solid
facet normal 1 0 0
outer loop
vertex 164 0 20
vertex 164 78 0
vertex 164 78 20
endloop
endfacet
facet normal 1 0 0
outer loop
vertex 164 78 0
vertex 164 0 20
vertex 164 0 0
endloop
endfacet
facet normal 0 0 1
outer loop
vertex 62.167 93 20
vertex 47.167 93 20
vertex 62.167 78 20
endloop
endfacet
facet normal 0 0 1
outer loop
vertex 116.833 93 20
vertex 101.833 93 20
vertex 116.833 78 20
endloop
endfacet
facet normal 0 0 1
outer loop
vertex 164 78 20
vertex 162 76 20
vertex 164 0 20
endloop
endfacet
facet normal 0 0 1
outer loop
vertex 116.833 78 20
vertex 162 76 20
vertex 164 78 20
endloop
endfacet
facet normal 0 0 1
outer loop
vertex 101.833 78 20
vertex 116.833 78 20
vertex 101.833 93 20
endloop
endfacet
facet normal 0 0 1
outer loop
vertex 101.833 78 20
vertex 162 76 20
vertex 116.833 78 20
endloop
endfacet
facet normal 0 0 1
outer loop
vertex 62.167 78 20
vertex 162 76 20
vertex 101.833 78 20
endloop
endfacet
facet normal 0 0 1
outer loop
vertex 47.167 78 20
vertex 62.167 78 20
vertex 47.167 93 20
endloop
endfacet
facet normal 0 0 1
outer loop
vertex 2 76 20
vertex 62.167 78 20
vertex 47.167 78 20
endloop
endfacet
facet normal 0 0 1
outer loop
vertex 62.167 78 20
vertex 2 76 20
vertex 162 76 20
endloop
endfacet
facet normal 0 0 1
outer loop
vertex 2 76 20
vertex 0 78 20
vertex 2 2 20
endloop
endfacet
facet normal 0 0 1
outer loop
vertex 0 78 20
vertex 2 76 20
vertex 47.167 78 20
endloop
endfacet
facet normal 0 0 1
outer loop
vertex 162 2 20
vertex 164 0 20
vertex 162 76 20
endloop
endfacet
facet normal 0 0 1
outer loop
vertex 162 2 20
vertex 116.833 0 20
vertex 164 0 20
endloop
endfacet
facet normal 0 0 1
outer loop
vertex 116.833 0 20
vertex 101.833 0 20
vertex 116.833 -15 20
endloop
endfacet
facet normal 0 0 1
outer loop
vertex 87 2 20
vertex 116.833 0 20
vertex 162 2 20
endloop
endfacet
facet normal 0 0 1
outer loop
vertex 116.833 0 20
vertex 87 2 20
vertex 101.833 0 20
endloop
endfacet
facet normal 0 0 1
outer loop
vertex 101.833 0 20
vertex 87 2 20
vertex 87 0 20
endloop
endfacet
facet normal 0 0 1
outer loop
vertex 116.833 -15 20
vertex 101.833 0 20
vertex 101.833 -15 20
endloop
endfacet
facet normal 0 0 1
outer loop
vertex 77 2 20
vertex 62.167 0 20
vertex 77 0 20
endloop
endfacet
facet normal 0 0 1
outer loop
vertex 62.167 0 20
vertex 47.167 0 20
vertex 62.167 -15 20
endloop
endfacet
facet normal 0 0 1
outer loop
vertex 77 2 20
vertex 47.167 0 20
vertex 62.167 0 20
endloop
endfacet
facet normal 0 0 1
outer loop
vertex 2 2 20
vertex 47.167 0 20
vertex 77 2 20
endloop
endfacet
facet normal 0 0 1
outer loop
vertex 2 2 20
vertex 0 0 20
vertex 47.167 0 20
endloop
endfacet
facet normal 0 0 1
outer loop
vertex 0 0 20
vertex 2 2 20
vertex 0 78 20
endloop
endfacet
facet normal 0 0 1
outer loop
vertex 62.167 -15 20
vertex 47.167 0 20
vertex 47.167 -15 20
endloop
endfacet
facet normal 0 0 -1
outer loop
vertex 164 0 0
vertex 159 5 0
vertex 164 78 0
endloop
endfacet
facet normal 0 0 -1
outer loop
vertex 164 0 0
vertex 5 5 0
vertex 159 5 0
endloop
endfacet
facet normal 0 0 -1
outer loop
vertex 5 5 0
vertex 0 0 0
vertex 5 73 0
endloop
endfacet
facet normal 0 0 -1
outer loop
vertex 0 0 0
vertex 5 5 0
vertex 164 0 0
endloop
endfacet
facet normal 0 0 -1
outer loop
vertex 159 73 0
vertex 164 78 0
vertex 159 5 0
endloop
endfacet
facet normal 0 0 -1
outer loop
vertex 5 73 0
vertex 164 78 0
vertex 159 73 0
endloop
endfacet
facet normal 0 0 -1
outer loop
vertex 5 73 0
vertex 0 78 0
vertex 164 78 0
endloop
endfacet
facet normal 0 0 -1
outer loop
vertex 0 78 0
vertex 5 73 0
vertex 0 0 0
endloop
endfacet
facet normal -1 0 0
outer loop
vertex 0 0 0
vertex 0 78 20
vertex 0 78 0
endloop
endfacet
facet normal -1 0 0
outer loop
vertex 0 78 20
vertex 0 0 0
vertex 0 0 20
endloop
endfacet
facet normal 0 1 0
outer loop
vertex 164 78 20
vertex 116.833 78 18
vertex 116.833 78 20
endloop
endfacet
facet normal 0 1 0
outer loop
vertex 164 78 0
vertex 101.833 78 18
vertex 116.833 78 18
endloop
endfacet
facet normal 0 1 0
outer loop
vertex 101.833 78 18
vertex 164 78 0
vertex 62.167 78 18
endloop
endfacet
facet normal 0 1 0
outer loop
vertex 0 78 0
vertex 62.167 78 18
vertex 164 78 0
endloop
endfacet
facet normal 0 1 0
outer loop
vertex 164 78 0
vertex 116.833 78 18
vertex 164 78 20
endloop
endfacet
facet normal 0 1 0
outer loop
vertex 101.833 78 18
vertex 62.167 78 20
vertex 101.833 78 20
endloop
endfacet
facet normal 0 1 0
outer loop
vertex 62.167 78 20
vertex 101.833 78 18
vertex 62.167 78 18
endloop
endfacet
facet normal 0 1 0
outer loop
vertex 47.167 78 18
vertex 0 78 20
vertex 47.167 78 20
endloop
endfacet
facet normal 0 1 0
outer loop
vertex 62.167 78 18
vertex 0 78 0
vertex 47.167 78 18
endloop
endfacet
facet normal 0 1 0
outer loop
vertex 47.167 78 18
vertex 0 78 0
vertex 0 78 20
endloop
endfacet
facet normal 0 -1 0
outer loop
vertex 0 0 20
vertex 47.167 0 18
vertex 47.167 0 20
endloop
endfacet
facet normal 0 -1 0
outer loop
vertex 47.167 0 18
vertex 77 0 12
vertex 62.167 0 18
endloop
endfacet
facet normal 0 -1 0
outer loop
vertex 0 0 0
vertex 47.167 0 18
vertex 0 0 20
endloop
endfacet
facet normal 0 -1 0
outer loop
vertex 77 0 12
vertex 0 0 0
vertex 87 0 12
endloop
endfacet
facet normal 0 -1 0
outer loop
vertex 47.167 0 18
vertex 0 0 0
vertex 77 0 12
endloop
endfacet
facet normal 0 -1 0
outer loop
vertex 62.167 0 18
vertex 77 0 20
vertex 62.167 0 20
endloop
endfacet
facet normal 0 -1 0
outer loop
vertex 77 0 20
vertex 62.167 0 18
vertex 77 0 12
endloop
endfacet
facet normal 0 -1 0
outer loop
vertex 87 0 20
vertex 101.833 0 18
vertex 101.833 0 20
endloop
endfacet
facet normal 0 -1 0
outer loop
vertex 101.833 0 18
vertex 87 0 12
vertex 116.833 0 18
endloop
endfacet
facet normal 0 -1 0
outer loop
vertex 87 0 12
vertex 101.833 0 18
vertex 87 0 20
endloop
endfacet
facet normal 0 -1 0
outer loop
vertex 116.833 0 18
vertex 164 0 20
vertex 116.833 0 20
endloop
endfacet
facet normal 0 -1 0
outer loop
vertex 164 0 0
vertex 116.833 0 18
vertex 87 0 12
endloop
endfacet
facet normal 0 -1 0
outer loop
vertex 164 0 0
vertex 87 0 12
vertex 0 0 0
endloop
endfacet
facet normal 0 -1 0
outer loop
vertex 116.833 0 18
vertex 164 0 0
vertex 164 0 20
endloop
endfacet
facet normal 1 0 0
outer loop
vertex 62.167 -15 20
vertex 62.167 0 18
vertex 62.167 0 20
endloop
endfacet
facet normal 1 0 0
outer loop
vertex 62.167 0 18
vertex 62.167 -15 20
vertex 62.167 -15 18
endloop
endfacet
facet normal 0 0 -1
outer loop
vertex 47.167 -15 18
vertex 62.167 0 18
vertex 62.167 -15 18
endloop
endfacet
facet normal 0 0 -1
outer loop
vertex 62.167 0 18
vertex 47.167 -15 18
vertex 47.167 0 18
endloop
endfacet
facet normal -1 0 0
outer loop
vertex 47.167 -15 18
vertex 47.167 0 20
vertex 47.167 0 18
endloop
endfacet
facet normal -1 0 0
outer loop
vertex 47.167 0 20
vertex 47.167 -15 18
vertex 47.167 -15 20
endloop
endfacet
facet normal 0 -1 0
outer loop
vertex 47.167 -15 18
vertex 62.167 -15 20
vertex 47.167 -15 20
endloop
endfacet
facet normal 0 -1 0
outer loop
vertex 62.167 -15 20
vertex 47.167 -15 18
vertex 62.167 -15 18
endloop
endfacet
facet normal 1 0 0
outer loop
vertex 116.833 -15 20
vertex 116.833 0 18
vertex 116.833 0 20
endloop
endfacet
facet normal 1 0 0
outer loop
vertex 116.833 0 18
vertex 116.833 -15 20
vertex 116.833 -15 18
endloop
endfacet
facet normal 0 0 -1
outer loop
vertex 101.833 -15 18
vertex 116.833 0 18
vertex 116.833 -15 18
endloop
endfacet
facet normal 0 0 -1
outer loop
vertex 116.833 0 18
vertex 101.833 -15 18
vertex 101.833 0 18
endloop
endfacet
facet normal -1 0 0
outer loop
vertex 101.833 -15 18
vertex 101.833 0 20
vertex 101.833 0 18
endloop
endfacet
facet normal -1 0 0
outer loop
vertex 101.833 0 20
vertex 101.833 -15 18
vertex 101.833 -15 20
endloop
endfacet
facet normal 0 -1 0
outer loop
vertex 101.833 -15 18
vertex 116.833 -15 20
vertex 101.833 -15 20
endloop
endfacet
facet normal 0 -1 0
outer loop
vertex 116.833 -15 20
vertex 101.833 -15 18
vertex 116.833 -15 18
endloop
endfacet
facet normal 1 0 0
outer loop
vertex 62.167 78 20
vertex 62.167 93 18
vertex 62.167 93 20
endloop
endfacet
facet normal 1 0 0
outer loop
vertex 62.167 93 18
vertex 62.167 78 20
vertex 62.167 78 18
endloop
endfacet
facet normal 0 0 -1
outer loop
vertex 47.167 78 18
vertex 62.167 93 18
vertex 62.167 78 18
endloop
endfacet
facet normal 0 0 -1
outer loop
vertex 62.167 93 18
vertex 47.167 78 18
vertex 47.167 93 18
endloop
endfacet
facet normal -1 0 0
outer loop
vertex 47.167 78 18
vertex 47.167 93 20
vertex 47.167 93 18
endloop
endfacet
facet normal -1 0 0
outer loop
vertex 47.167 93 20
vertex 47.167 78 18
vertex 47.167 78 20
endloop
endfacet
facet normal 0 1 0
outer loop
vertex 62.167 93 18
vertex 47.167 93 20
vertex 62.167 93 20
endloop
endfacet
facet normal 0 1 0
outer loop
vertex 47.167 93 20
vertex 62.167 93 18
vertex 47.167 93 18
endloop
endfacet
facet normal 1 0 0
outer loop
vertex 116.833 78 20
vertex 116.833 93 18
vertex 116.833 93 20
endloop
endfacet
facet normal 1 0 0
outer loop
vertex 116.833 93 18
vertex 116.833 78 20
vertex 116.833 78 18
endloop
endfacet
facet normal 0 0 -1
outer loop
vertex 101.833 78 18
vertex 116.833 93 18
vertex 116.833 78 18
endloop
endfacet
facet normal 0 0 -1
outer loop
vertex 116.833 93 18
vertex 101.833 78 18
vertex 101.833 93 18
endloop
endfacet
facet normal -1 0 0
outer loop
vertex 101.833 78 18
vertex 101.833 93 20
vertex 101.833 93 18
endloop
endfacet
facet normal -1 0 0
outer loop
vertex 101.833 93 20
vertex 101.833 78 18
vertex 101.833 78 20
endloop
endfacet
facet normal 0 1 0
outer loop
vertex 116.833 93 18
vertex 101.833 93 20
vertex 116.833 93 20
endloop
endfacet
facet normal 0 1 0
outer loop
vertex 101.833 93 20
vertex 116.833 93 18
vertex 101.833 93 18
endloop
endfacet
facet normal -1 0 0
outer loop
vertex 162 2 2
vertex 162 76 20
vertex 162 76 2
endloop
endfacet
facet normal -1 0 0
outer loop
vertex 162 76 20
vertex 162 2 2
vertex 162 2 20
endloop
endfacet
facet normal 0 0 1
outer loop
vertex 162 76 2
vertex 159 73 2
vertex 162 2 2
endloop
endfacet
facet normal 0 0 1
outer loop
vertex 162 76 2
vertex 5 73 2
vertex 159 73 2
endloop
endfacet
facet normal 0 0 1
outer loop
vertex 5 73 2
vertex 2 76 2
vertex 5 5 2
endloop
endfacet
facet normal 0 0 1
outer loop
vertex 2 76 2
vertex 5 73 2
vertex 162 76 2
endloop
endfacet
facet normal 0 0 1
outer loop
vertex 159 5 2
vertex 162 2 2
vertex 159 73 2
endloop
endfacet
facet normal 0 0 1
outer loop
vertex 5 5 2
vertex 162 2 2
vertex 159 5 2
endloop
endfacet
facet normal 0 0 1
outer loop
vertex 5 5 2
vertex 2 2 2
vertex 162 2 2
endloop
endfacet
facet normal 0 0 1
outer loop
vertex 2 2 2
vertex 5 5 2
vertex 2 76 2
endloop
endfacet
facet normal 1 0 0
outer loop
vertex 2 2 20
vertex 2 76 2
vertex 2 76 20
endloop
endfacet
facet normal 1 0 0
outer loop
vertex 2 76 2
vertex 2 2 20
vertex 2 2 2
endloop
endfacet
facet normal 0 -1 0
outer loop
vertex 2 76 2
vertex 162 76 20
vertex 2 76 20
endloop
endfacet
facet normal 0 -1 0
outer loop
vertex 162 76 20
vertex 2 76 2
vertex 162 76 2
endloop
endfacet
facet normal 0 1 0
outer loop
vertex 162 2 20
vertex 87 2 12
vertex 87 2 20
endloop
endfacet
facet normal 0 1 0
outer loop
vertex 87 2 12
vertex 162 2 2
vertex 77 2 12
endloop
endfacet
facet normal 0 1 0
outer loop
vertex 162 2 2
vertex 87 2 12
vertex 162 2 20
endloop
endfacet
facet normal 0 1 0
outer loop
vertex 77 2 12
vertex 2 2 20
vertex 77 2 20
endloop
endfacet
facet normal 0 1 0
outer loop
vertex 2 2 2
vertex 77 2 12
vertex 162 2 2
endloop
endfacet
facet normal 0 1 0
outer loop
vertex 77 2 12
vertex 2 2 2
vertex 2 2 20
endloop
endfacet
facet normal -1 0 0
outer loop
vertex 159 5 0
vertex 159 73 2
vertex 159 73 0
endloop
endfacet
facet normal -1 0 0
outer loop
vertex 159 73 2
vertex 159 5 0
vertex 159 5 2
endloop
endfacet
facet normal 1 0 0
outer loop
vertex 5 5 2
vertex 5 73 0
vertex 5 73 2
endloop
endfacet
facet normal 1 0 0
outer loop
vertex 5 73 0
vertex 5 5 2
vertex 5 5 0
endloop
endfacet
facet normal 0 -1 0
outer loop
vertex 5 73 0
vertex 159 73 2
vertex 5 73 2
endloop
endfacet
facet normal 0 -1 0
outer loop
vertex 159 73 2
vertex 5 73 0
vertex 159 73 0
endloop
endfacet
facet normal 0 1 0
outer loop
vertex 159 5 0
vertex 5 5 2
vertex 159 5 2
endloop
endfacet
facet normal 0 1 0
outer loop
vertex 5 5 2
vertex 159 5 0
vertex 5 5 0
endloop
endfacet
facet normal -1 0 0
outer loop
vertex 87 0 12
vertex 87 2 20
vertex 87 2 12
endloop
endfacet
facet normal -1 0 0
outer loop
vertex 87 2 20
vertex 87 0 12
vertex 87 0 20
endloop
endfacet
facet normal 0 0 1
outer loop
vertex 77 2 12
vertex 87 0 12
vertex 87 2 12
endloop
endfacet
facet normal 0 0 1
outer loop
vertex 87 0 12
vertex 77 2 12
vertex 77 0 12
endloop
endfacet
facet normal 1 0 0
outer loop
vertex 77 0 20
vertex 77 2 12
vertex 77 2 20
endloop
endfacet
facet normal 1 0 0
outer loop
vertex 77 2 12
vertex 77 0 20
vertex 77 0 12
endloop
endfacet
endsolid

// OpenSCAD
// Box enclosure for 160x74x18mm object

// Inner dimensions (the object to enclose)
inner_length = 160;
inner_width = 74;
inner_height = 18;

// Wall thickness
wall = 2;

// Bottom hole inset from inner walls
hole_inset = 3;

// Side hole dimensions
side_hole_width = 10;
side_hole_height = 8;

// Overhang dimensions
overhang_width = 15;
overhang_length = 15;

// Outer dimensions
outer_length = inner_length + 2 * wall;
outer_width = inner_width + 2 * wall;
outer_height = inner_height + wall; // wall on bottom only, open top

// Bottom hole dimensions
hole_length = inner_length - 2 * hole_inset;
hole_width = inner_width - 2 * hole_inset;

// Overhang positions along X (evenly spaced)
overhang_spacing = outer_length / 3;
overhang_x1 = overhang_spacing - overhang_width / 2;
overhang_x2 = 2 * overhang_spacing - overhang_width / 2;

difference() {
    union() {
        // Outer shell
        cube([outer_length, outer_width, outer_height]);

        // Left side overhangs (Y=0, extending in -Y)
        translate([overhang_x1, -overhang_length, outer_height - wall])
            cube([overhang_width, overhang_length, wall]);
        translate([overhang_x2, -overhang_length, outer_height - wall])
            cube([overhang_width, overhang_length, wall]);

        // Right side overhangs (Y=outer_width, extending in +Y)
        translate([overhang_x1, outer_width, outer_height - wall])
            cube([overhang_width, overhang_length, wall]);
        translate([overhang_x2, outer_width, outer_height - wall])
            cube([overhang_width, overhang_length, wall]);
    }

    // Inner cavity
    translate([wall, wall, wall])
        cube([inner_length, inner_width, inner_height + 1]);

    // Square hole in the bottom
    translate([wall + hole_inset, wall + hole_inset, -1])
        cube([hole_length, hole_width, wall + 2]);

    // Hole on the long side (front), centered horizontally, near top edge
    translate([outer_length / 2 - side_hole_width / 2, -1, outer_height - side_hole_height])
        cube([side_hole_width, wall + 2, side_hole_height + 1]);
}
